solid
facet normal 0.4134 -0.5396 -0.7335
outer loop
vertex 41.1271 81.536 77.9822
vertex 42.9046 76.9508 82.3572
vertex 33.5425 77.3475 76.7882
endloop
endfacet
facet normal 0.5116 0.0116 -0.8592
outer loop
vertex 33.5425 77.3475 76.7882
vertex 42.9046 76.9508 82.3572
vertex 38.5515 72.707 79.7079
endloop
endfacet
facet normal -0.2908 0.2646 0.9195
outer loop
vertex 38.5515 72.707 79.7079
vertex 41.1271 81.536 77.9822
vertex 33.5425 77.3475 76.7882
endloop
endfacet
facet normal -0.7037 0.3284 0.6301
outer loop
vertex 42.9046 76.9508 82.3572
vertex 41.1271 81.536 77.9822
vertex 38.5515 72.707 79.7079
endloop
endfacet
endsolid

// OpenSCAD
// Auto-generated auxetic polyhedron
points = [
    [33.542513, 77.347475, 76.788154],
    [42.904640, 76.950780, 82.357239],
    [41.127082, 81.535986, 77.982240],
    [38.551468, 72.706994, 79.707894],
];

faces = [
    [0, 1, 2],
    [3, 1, 0],
    [0, 2, 3],
    [3, 2, 1],
];

polyhedron(points = points, faces = faces);
